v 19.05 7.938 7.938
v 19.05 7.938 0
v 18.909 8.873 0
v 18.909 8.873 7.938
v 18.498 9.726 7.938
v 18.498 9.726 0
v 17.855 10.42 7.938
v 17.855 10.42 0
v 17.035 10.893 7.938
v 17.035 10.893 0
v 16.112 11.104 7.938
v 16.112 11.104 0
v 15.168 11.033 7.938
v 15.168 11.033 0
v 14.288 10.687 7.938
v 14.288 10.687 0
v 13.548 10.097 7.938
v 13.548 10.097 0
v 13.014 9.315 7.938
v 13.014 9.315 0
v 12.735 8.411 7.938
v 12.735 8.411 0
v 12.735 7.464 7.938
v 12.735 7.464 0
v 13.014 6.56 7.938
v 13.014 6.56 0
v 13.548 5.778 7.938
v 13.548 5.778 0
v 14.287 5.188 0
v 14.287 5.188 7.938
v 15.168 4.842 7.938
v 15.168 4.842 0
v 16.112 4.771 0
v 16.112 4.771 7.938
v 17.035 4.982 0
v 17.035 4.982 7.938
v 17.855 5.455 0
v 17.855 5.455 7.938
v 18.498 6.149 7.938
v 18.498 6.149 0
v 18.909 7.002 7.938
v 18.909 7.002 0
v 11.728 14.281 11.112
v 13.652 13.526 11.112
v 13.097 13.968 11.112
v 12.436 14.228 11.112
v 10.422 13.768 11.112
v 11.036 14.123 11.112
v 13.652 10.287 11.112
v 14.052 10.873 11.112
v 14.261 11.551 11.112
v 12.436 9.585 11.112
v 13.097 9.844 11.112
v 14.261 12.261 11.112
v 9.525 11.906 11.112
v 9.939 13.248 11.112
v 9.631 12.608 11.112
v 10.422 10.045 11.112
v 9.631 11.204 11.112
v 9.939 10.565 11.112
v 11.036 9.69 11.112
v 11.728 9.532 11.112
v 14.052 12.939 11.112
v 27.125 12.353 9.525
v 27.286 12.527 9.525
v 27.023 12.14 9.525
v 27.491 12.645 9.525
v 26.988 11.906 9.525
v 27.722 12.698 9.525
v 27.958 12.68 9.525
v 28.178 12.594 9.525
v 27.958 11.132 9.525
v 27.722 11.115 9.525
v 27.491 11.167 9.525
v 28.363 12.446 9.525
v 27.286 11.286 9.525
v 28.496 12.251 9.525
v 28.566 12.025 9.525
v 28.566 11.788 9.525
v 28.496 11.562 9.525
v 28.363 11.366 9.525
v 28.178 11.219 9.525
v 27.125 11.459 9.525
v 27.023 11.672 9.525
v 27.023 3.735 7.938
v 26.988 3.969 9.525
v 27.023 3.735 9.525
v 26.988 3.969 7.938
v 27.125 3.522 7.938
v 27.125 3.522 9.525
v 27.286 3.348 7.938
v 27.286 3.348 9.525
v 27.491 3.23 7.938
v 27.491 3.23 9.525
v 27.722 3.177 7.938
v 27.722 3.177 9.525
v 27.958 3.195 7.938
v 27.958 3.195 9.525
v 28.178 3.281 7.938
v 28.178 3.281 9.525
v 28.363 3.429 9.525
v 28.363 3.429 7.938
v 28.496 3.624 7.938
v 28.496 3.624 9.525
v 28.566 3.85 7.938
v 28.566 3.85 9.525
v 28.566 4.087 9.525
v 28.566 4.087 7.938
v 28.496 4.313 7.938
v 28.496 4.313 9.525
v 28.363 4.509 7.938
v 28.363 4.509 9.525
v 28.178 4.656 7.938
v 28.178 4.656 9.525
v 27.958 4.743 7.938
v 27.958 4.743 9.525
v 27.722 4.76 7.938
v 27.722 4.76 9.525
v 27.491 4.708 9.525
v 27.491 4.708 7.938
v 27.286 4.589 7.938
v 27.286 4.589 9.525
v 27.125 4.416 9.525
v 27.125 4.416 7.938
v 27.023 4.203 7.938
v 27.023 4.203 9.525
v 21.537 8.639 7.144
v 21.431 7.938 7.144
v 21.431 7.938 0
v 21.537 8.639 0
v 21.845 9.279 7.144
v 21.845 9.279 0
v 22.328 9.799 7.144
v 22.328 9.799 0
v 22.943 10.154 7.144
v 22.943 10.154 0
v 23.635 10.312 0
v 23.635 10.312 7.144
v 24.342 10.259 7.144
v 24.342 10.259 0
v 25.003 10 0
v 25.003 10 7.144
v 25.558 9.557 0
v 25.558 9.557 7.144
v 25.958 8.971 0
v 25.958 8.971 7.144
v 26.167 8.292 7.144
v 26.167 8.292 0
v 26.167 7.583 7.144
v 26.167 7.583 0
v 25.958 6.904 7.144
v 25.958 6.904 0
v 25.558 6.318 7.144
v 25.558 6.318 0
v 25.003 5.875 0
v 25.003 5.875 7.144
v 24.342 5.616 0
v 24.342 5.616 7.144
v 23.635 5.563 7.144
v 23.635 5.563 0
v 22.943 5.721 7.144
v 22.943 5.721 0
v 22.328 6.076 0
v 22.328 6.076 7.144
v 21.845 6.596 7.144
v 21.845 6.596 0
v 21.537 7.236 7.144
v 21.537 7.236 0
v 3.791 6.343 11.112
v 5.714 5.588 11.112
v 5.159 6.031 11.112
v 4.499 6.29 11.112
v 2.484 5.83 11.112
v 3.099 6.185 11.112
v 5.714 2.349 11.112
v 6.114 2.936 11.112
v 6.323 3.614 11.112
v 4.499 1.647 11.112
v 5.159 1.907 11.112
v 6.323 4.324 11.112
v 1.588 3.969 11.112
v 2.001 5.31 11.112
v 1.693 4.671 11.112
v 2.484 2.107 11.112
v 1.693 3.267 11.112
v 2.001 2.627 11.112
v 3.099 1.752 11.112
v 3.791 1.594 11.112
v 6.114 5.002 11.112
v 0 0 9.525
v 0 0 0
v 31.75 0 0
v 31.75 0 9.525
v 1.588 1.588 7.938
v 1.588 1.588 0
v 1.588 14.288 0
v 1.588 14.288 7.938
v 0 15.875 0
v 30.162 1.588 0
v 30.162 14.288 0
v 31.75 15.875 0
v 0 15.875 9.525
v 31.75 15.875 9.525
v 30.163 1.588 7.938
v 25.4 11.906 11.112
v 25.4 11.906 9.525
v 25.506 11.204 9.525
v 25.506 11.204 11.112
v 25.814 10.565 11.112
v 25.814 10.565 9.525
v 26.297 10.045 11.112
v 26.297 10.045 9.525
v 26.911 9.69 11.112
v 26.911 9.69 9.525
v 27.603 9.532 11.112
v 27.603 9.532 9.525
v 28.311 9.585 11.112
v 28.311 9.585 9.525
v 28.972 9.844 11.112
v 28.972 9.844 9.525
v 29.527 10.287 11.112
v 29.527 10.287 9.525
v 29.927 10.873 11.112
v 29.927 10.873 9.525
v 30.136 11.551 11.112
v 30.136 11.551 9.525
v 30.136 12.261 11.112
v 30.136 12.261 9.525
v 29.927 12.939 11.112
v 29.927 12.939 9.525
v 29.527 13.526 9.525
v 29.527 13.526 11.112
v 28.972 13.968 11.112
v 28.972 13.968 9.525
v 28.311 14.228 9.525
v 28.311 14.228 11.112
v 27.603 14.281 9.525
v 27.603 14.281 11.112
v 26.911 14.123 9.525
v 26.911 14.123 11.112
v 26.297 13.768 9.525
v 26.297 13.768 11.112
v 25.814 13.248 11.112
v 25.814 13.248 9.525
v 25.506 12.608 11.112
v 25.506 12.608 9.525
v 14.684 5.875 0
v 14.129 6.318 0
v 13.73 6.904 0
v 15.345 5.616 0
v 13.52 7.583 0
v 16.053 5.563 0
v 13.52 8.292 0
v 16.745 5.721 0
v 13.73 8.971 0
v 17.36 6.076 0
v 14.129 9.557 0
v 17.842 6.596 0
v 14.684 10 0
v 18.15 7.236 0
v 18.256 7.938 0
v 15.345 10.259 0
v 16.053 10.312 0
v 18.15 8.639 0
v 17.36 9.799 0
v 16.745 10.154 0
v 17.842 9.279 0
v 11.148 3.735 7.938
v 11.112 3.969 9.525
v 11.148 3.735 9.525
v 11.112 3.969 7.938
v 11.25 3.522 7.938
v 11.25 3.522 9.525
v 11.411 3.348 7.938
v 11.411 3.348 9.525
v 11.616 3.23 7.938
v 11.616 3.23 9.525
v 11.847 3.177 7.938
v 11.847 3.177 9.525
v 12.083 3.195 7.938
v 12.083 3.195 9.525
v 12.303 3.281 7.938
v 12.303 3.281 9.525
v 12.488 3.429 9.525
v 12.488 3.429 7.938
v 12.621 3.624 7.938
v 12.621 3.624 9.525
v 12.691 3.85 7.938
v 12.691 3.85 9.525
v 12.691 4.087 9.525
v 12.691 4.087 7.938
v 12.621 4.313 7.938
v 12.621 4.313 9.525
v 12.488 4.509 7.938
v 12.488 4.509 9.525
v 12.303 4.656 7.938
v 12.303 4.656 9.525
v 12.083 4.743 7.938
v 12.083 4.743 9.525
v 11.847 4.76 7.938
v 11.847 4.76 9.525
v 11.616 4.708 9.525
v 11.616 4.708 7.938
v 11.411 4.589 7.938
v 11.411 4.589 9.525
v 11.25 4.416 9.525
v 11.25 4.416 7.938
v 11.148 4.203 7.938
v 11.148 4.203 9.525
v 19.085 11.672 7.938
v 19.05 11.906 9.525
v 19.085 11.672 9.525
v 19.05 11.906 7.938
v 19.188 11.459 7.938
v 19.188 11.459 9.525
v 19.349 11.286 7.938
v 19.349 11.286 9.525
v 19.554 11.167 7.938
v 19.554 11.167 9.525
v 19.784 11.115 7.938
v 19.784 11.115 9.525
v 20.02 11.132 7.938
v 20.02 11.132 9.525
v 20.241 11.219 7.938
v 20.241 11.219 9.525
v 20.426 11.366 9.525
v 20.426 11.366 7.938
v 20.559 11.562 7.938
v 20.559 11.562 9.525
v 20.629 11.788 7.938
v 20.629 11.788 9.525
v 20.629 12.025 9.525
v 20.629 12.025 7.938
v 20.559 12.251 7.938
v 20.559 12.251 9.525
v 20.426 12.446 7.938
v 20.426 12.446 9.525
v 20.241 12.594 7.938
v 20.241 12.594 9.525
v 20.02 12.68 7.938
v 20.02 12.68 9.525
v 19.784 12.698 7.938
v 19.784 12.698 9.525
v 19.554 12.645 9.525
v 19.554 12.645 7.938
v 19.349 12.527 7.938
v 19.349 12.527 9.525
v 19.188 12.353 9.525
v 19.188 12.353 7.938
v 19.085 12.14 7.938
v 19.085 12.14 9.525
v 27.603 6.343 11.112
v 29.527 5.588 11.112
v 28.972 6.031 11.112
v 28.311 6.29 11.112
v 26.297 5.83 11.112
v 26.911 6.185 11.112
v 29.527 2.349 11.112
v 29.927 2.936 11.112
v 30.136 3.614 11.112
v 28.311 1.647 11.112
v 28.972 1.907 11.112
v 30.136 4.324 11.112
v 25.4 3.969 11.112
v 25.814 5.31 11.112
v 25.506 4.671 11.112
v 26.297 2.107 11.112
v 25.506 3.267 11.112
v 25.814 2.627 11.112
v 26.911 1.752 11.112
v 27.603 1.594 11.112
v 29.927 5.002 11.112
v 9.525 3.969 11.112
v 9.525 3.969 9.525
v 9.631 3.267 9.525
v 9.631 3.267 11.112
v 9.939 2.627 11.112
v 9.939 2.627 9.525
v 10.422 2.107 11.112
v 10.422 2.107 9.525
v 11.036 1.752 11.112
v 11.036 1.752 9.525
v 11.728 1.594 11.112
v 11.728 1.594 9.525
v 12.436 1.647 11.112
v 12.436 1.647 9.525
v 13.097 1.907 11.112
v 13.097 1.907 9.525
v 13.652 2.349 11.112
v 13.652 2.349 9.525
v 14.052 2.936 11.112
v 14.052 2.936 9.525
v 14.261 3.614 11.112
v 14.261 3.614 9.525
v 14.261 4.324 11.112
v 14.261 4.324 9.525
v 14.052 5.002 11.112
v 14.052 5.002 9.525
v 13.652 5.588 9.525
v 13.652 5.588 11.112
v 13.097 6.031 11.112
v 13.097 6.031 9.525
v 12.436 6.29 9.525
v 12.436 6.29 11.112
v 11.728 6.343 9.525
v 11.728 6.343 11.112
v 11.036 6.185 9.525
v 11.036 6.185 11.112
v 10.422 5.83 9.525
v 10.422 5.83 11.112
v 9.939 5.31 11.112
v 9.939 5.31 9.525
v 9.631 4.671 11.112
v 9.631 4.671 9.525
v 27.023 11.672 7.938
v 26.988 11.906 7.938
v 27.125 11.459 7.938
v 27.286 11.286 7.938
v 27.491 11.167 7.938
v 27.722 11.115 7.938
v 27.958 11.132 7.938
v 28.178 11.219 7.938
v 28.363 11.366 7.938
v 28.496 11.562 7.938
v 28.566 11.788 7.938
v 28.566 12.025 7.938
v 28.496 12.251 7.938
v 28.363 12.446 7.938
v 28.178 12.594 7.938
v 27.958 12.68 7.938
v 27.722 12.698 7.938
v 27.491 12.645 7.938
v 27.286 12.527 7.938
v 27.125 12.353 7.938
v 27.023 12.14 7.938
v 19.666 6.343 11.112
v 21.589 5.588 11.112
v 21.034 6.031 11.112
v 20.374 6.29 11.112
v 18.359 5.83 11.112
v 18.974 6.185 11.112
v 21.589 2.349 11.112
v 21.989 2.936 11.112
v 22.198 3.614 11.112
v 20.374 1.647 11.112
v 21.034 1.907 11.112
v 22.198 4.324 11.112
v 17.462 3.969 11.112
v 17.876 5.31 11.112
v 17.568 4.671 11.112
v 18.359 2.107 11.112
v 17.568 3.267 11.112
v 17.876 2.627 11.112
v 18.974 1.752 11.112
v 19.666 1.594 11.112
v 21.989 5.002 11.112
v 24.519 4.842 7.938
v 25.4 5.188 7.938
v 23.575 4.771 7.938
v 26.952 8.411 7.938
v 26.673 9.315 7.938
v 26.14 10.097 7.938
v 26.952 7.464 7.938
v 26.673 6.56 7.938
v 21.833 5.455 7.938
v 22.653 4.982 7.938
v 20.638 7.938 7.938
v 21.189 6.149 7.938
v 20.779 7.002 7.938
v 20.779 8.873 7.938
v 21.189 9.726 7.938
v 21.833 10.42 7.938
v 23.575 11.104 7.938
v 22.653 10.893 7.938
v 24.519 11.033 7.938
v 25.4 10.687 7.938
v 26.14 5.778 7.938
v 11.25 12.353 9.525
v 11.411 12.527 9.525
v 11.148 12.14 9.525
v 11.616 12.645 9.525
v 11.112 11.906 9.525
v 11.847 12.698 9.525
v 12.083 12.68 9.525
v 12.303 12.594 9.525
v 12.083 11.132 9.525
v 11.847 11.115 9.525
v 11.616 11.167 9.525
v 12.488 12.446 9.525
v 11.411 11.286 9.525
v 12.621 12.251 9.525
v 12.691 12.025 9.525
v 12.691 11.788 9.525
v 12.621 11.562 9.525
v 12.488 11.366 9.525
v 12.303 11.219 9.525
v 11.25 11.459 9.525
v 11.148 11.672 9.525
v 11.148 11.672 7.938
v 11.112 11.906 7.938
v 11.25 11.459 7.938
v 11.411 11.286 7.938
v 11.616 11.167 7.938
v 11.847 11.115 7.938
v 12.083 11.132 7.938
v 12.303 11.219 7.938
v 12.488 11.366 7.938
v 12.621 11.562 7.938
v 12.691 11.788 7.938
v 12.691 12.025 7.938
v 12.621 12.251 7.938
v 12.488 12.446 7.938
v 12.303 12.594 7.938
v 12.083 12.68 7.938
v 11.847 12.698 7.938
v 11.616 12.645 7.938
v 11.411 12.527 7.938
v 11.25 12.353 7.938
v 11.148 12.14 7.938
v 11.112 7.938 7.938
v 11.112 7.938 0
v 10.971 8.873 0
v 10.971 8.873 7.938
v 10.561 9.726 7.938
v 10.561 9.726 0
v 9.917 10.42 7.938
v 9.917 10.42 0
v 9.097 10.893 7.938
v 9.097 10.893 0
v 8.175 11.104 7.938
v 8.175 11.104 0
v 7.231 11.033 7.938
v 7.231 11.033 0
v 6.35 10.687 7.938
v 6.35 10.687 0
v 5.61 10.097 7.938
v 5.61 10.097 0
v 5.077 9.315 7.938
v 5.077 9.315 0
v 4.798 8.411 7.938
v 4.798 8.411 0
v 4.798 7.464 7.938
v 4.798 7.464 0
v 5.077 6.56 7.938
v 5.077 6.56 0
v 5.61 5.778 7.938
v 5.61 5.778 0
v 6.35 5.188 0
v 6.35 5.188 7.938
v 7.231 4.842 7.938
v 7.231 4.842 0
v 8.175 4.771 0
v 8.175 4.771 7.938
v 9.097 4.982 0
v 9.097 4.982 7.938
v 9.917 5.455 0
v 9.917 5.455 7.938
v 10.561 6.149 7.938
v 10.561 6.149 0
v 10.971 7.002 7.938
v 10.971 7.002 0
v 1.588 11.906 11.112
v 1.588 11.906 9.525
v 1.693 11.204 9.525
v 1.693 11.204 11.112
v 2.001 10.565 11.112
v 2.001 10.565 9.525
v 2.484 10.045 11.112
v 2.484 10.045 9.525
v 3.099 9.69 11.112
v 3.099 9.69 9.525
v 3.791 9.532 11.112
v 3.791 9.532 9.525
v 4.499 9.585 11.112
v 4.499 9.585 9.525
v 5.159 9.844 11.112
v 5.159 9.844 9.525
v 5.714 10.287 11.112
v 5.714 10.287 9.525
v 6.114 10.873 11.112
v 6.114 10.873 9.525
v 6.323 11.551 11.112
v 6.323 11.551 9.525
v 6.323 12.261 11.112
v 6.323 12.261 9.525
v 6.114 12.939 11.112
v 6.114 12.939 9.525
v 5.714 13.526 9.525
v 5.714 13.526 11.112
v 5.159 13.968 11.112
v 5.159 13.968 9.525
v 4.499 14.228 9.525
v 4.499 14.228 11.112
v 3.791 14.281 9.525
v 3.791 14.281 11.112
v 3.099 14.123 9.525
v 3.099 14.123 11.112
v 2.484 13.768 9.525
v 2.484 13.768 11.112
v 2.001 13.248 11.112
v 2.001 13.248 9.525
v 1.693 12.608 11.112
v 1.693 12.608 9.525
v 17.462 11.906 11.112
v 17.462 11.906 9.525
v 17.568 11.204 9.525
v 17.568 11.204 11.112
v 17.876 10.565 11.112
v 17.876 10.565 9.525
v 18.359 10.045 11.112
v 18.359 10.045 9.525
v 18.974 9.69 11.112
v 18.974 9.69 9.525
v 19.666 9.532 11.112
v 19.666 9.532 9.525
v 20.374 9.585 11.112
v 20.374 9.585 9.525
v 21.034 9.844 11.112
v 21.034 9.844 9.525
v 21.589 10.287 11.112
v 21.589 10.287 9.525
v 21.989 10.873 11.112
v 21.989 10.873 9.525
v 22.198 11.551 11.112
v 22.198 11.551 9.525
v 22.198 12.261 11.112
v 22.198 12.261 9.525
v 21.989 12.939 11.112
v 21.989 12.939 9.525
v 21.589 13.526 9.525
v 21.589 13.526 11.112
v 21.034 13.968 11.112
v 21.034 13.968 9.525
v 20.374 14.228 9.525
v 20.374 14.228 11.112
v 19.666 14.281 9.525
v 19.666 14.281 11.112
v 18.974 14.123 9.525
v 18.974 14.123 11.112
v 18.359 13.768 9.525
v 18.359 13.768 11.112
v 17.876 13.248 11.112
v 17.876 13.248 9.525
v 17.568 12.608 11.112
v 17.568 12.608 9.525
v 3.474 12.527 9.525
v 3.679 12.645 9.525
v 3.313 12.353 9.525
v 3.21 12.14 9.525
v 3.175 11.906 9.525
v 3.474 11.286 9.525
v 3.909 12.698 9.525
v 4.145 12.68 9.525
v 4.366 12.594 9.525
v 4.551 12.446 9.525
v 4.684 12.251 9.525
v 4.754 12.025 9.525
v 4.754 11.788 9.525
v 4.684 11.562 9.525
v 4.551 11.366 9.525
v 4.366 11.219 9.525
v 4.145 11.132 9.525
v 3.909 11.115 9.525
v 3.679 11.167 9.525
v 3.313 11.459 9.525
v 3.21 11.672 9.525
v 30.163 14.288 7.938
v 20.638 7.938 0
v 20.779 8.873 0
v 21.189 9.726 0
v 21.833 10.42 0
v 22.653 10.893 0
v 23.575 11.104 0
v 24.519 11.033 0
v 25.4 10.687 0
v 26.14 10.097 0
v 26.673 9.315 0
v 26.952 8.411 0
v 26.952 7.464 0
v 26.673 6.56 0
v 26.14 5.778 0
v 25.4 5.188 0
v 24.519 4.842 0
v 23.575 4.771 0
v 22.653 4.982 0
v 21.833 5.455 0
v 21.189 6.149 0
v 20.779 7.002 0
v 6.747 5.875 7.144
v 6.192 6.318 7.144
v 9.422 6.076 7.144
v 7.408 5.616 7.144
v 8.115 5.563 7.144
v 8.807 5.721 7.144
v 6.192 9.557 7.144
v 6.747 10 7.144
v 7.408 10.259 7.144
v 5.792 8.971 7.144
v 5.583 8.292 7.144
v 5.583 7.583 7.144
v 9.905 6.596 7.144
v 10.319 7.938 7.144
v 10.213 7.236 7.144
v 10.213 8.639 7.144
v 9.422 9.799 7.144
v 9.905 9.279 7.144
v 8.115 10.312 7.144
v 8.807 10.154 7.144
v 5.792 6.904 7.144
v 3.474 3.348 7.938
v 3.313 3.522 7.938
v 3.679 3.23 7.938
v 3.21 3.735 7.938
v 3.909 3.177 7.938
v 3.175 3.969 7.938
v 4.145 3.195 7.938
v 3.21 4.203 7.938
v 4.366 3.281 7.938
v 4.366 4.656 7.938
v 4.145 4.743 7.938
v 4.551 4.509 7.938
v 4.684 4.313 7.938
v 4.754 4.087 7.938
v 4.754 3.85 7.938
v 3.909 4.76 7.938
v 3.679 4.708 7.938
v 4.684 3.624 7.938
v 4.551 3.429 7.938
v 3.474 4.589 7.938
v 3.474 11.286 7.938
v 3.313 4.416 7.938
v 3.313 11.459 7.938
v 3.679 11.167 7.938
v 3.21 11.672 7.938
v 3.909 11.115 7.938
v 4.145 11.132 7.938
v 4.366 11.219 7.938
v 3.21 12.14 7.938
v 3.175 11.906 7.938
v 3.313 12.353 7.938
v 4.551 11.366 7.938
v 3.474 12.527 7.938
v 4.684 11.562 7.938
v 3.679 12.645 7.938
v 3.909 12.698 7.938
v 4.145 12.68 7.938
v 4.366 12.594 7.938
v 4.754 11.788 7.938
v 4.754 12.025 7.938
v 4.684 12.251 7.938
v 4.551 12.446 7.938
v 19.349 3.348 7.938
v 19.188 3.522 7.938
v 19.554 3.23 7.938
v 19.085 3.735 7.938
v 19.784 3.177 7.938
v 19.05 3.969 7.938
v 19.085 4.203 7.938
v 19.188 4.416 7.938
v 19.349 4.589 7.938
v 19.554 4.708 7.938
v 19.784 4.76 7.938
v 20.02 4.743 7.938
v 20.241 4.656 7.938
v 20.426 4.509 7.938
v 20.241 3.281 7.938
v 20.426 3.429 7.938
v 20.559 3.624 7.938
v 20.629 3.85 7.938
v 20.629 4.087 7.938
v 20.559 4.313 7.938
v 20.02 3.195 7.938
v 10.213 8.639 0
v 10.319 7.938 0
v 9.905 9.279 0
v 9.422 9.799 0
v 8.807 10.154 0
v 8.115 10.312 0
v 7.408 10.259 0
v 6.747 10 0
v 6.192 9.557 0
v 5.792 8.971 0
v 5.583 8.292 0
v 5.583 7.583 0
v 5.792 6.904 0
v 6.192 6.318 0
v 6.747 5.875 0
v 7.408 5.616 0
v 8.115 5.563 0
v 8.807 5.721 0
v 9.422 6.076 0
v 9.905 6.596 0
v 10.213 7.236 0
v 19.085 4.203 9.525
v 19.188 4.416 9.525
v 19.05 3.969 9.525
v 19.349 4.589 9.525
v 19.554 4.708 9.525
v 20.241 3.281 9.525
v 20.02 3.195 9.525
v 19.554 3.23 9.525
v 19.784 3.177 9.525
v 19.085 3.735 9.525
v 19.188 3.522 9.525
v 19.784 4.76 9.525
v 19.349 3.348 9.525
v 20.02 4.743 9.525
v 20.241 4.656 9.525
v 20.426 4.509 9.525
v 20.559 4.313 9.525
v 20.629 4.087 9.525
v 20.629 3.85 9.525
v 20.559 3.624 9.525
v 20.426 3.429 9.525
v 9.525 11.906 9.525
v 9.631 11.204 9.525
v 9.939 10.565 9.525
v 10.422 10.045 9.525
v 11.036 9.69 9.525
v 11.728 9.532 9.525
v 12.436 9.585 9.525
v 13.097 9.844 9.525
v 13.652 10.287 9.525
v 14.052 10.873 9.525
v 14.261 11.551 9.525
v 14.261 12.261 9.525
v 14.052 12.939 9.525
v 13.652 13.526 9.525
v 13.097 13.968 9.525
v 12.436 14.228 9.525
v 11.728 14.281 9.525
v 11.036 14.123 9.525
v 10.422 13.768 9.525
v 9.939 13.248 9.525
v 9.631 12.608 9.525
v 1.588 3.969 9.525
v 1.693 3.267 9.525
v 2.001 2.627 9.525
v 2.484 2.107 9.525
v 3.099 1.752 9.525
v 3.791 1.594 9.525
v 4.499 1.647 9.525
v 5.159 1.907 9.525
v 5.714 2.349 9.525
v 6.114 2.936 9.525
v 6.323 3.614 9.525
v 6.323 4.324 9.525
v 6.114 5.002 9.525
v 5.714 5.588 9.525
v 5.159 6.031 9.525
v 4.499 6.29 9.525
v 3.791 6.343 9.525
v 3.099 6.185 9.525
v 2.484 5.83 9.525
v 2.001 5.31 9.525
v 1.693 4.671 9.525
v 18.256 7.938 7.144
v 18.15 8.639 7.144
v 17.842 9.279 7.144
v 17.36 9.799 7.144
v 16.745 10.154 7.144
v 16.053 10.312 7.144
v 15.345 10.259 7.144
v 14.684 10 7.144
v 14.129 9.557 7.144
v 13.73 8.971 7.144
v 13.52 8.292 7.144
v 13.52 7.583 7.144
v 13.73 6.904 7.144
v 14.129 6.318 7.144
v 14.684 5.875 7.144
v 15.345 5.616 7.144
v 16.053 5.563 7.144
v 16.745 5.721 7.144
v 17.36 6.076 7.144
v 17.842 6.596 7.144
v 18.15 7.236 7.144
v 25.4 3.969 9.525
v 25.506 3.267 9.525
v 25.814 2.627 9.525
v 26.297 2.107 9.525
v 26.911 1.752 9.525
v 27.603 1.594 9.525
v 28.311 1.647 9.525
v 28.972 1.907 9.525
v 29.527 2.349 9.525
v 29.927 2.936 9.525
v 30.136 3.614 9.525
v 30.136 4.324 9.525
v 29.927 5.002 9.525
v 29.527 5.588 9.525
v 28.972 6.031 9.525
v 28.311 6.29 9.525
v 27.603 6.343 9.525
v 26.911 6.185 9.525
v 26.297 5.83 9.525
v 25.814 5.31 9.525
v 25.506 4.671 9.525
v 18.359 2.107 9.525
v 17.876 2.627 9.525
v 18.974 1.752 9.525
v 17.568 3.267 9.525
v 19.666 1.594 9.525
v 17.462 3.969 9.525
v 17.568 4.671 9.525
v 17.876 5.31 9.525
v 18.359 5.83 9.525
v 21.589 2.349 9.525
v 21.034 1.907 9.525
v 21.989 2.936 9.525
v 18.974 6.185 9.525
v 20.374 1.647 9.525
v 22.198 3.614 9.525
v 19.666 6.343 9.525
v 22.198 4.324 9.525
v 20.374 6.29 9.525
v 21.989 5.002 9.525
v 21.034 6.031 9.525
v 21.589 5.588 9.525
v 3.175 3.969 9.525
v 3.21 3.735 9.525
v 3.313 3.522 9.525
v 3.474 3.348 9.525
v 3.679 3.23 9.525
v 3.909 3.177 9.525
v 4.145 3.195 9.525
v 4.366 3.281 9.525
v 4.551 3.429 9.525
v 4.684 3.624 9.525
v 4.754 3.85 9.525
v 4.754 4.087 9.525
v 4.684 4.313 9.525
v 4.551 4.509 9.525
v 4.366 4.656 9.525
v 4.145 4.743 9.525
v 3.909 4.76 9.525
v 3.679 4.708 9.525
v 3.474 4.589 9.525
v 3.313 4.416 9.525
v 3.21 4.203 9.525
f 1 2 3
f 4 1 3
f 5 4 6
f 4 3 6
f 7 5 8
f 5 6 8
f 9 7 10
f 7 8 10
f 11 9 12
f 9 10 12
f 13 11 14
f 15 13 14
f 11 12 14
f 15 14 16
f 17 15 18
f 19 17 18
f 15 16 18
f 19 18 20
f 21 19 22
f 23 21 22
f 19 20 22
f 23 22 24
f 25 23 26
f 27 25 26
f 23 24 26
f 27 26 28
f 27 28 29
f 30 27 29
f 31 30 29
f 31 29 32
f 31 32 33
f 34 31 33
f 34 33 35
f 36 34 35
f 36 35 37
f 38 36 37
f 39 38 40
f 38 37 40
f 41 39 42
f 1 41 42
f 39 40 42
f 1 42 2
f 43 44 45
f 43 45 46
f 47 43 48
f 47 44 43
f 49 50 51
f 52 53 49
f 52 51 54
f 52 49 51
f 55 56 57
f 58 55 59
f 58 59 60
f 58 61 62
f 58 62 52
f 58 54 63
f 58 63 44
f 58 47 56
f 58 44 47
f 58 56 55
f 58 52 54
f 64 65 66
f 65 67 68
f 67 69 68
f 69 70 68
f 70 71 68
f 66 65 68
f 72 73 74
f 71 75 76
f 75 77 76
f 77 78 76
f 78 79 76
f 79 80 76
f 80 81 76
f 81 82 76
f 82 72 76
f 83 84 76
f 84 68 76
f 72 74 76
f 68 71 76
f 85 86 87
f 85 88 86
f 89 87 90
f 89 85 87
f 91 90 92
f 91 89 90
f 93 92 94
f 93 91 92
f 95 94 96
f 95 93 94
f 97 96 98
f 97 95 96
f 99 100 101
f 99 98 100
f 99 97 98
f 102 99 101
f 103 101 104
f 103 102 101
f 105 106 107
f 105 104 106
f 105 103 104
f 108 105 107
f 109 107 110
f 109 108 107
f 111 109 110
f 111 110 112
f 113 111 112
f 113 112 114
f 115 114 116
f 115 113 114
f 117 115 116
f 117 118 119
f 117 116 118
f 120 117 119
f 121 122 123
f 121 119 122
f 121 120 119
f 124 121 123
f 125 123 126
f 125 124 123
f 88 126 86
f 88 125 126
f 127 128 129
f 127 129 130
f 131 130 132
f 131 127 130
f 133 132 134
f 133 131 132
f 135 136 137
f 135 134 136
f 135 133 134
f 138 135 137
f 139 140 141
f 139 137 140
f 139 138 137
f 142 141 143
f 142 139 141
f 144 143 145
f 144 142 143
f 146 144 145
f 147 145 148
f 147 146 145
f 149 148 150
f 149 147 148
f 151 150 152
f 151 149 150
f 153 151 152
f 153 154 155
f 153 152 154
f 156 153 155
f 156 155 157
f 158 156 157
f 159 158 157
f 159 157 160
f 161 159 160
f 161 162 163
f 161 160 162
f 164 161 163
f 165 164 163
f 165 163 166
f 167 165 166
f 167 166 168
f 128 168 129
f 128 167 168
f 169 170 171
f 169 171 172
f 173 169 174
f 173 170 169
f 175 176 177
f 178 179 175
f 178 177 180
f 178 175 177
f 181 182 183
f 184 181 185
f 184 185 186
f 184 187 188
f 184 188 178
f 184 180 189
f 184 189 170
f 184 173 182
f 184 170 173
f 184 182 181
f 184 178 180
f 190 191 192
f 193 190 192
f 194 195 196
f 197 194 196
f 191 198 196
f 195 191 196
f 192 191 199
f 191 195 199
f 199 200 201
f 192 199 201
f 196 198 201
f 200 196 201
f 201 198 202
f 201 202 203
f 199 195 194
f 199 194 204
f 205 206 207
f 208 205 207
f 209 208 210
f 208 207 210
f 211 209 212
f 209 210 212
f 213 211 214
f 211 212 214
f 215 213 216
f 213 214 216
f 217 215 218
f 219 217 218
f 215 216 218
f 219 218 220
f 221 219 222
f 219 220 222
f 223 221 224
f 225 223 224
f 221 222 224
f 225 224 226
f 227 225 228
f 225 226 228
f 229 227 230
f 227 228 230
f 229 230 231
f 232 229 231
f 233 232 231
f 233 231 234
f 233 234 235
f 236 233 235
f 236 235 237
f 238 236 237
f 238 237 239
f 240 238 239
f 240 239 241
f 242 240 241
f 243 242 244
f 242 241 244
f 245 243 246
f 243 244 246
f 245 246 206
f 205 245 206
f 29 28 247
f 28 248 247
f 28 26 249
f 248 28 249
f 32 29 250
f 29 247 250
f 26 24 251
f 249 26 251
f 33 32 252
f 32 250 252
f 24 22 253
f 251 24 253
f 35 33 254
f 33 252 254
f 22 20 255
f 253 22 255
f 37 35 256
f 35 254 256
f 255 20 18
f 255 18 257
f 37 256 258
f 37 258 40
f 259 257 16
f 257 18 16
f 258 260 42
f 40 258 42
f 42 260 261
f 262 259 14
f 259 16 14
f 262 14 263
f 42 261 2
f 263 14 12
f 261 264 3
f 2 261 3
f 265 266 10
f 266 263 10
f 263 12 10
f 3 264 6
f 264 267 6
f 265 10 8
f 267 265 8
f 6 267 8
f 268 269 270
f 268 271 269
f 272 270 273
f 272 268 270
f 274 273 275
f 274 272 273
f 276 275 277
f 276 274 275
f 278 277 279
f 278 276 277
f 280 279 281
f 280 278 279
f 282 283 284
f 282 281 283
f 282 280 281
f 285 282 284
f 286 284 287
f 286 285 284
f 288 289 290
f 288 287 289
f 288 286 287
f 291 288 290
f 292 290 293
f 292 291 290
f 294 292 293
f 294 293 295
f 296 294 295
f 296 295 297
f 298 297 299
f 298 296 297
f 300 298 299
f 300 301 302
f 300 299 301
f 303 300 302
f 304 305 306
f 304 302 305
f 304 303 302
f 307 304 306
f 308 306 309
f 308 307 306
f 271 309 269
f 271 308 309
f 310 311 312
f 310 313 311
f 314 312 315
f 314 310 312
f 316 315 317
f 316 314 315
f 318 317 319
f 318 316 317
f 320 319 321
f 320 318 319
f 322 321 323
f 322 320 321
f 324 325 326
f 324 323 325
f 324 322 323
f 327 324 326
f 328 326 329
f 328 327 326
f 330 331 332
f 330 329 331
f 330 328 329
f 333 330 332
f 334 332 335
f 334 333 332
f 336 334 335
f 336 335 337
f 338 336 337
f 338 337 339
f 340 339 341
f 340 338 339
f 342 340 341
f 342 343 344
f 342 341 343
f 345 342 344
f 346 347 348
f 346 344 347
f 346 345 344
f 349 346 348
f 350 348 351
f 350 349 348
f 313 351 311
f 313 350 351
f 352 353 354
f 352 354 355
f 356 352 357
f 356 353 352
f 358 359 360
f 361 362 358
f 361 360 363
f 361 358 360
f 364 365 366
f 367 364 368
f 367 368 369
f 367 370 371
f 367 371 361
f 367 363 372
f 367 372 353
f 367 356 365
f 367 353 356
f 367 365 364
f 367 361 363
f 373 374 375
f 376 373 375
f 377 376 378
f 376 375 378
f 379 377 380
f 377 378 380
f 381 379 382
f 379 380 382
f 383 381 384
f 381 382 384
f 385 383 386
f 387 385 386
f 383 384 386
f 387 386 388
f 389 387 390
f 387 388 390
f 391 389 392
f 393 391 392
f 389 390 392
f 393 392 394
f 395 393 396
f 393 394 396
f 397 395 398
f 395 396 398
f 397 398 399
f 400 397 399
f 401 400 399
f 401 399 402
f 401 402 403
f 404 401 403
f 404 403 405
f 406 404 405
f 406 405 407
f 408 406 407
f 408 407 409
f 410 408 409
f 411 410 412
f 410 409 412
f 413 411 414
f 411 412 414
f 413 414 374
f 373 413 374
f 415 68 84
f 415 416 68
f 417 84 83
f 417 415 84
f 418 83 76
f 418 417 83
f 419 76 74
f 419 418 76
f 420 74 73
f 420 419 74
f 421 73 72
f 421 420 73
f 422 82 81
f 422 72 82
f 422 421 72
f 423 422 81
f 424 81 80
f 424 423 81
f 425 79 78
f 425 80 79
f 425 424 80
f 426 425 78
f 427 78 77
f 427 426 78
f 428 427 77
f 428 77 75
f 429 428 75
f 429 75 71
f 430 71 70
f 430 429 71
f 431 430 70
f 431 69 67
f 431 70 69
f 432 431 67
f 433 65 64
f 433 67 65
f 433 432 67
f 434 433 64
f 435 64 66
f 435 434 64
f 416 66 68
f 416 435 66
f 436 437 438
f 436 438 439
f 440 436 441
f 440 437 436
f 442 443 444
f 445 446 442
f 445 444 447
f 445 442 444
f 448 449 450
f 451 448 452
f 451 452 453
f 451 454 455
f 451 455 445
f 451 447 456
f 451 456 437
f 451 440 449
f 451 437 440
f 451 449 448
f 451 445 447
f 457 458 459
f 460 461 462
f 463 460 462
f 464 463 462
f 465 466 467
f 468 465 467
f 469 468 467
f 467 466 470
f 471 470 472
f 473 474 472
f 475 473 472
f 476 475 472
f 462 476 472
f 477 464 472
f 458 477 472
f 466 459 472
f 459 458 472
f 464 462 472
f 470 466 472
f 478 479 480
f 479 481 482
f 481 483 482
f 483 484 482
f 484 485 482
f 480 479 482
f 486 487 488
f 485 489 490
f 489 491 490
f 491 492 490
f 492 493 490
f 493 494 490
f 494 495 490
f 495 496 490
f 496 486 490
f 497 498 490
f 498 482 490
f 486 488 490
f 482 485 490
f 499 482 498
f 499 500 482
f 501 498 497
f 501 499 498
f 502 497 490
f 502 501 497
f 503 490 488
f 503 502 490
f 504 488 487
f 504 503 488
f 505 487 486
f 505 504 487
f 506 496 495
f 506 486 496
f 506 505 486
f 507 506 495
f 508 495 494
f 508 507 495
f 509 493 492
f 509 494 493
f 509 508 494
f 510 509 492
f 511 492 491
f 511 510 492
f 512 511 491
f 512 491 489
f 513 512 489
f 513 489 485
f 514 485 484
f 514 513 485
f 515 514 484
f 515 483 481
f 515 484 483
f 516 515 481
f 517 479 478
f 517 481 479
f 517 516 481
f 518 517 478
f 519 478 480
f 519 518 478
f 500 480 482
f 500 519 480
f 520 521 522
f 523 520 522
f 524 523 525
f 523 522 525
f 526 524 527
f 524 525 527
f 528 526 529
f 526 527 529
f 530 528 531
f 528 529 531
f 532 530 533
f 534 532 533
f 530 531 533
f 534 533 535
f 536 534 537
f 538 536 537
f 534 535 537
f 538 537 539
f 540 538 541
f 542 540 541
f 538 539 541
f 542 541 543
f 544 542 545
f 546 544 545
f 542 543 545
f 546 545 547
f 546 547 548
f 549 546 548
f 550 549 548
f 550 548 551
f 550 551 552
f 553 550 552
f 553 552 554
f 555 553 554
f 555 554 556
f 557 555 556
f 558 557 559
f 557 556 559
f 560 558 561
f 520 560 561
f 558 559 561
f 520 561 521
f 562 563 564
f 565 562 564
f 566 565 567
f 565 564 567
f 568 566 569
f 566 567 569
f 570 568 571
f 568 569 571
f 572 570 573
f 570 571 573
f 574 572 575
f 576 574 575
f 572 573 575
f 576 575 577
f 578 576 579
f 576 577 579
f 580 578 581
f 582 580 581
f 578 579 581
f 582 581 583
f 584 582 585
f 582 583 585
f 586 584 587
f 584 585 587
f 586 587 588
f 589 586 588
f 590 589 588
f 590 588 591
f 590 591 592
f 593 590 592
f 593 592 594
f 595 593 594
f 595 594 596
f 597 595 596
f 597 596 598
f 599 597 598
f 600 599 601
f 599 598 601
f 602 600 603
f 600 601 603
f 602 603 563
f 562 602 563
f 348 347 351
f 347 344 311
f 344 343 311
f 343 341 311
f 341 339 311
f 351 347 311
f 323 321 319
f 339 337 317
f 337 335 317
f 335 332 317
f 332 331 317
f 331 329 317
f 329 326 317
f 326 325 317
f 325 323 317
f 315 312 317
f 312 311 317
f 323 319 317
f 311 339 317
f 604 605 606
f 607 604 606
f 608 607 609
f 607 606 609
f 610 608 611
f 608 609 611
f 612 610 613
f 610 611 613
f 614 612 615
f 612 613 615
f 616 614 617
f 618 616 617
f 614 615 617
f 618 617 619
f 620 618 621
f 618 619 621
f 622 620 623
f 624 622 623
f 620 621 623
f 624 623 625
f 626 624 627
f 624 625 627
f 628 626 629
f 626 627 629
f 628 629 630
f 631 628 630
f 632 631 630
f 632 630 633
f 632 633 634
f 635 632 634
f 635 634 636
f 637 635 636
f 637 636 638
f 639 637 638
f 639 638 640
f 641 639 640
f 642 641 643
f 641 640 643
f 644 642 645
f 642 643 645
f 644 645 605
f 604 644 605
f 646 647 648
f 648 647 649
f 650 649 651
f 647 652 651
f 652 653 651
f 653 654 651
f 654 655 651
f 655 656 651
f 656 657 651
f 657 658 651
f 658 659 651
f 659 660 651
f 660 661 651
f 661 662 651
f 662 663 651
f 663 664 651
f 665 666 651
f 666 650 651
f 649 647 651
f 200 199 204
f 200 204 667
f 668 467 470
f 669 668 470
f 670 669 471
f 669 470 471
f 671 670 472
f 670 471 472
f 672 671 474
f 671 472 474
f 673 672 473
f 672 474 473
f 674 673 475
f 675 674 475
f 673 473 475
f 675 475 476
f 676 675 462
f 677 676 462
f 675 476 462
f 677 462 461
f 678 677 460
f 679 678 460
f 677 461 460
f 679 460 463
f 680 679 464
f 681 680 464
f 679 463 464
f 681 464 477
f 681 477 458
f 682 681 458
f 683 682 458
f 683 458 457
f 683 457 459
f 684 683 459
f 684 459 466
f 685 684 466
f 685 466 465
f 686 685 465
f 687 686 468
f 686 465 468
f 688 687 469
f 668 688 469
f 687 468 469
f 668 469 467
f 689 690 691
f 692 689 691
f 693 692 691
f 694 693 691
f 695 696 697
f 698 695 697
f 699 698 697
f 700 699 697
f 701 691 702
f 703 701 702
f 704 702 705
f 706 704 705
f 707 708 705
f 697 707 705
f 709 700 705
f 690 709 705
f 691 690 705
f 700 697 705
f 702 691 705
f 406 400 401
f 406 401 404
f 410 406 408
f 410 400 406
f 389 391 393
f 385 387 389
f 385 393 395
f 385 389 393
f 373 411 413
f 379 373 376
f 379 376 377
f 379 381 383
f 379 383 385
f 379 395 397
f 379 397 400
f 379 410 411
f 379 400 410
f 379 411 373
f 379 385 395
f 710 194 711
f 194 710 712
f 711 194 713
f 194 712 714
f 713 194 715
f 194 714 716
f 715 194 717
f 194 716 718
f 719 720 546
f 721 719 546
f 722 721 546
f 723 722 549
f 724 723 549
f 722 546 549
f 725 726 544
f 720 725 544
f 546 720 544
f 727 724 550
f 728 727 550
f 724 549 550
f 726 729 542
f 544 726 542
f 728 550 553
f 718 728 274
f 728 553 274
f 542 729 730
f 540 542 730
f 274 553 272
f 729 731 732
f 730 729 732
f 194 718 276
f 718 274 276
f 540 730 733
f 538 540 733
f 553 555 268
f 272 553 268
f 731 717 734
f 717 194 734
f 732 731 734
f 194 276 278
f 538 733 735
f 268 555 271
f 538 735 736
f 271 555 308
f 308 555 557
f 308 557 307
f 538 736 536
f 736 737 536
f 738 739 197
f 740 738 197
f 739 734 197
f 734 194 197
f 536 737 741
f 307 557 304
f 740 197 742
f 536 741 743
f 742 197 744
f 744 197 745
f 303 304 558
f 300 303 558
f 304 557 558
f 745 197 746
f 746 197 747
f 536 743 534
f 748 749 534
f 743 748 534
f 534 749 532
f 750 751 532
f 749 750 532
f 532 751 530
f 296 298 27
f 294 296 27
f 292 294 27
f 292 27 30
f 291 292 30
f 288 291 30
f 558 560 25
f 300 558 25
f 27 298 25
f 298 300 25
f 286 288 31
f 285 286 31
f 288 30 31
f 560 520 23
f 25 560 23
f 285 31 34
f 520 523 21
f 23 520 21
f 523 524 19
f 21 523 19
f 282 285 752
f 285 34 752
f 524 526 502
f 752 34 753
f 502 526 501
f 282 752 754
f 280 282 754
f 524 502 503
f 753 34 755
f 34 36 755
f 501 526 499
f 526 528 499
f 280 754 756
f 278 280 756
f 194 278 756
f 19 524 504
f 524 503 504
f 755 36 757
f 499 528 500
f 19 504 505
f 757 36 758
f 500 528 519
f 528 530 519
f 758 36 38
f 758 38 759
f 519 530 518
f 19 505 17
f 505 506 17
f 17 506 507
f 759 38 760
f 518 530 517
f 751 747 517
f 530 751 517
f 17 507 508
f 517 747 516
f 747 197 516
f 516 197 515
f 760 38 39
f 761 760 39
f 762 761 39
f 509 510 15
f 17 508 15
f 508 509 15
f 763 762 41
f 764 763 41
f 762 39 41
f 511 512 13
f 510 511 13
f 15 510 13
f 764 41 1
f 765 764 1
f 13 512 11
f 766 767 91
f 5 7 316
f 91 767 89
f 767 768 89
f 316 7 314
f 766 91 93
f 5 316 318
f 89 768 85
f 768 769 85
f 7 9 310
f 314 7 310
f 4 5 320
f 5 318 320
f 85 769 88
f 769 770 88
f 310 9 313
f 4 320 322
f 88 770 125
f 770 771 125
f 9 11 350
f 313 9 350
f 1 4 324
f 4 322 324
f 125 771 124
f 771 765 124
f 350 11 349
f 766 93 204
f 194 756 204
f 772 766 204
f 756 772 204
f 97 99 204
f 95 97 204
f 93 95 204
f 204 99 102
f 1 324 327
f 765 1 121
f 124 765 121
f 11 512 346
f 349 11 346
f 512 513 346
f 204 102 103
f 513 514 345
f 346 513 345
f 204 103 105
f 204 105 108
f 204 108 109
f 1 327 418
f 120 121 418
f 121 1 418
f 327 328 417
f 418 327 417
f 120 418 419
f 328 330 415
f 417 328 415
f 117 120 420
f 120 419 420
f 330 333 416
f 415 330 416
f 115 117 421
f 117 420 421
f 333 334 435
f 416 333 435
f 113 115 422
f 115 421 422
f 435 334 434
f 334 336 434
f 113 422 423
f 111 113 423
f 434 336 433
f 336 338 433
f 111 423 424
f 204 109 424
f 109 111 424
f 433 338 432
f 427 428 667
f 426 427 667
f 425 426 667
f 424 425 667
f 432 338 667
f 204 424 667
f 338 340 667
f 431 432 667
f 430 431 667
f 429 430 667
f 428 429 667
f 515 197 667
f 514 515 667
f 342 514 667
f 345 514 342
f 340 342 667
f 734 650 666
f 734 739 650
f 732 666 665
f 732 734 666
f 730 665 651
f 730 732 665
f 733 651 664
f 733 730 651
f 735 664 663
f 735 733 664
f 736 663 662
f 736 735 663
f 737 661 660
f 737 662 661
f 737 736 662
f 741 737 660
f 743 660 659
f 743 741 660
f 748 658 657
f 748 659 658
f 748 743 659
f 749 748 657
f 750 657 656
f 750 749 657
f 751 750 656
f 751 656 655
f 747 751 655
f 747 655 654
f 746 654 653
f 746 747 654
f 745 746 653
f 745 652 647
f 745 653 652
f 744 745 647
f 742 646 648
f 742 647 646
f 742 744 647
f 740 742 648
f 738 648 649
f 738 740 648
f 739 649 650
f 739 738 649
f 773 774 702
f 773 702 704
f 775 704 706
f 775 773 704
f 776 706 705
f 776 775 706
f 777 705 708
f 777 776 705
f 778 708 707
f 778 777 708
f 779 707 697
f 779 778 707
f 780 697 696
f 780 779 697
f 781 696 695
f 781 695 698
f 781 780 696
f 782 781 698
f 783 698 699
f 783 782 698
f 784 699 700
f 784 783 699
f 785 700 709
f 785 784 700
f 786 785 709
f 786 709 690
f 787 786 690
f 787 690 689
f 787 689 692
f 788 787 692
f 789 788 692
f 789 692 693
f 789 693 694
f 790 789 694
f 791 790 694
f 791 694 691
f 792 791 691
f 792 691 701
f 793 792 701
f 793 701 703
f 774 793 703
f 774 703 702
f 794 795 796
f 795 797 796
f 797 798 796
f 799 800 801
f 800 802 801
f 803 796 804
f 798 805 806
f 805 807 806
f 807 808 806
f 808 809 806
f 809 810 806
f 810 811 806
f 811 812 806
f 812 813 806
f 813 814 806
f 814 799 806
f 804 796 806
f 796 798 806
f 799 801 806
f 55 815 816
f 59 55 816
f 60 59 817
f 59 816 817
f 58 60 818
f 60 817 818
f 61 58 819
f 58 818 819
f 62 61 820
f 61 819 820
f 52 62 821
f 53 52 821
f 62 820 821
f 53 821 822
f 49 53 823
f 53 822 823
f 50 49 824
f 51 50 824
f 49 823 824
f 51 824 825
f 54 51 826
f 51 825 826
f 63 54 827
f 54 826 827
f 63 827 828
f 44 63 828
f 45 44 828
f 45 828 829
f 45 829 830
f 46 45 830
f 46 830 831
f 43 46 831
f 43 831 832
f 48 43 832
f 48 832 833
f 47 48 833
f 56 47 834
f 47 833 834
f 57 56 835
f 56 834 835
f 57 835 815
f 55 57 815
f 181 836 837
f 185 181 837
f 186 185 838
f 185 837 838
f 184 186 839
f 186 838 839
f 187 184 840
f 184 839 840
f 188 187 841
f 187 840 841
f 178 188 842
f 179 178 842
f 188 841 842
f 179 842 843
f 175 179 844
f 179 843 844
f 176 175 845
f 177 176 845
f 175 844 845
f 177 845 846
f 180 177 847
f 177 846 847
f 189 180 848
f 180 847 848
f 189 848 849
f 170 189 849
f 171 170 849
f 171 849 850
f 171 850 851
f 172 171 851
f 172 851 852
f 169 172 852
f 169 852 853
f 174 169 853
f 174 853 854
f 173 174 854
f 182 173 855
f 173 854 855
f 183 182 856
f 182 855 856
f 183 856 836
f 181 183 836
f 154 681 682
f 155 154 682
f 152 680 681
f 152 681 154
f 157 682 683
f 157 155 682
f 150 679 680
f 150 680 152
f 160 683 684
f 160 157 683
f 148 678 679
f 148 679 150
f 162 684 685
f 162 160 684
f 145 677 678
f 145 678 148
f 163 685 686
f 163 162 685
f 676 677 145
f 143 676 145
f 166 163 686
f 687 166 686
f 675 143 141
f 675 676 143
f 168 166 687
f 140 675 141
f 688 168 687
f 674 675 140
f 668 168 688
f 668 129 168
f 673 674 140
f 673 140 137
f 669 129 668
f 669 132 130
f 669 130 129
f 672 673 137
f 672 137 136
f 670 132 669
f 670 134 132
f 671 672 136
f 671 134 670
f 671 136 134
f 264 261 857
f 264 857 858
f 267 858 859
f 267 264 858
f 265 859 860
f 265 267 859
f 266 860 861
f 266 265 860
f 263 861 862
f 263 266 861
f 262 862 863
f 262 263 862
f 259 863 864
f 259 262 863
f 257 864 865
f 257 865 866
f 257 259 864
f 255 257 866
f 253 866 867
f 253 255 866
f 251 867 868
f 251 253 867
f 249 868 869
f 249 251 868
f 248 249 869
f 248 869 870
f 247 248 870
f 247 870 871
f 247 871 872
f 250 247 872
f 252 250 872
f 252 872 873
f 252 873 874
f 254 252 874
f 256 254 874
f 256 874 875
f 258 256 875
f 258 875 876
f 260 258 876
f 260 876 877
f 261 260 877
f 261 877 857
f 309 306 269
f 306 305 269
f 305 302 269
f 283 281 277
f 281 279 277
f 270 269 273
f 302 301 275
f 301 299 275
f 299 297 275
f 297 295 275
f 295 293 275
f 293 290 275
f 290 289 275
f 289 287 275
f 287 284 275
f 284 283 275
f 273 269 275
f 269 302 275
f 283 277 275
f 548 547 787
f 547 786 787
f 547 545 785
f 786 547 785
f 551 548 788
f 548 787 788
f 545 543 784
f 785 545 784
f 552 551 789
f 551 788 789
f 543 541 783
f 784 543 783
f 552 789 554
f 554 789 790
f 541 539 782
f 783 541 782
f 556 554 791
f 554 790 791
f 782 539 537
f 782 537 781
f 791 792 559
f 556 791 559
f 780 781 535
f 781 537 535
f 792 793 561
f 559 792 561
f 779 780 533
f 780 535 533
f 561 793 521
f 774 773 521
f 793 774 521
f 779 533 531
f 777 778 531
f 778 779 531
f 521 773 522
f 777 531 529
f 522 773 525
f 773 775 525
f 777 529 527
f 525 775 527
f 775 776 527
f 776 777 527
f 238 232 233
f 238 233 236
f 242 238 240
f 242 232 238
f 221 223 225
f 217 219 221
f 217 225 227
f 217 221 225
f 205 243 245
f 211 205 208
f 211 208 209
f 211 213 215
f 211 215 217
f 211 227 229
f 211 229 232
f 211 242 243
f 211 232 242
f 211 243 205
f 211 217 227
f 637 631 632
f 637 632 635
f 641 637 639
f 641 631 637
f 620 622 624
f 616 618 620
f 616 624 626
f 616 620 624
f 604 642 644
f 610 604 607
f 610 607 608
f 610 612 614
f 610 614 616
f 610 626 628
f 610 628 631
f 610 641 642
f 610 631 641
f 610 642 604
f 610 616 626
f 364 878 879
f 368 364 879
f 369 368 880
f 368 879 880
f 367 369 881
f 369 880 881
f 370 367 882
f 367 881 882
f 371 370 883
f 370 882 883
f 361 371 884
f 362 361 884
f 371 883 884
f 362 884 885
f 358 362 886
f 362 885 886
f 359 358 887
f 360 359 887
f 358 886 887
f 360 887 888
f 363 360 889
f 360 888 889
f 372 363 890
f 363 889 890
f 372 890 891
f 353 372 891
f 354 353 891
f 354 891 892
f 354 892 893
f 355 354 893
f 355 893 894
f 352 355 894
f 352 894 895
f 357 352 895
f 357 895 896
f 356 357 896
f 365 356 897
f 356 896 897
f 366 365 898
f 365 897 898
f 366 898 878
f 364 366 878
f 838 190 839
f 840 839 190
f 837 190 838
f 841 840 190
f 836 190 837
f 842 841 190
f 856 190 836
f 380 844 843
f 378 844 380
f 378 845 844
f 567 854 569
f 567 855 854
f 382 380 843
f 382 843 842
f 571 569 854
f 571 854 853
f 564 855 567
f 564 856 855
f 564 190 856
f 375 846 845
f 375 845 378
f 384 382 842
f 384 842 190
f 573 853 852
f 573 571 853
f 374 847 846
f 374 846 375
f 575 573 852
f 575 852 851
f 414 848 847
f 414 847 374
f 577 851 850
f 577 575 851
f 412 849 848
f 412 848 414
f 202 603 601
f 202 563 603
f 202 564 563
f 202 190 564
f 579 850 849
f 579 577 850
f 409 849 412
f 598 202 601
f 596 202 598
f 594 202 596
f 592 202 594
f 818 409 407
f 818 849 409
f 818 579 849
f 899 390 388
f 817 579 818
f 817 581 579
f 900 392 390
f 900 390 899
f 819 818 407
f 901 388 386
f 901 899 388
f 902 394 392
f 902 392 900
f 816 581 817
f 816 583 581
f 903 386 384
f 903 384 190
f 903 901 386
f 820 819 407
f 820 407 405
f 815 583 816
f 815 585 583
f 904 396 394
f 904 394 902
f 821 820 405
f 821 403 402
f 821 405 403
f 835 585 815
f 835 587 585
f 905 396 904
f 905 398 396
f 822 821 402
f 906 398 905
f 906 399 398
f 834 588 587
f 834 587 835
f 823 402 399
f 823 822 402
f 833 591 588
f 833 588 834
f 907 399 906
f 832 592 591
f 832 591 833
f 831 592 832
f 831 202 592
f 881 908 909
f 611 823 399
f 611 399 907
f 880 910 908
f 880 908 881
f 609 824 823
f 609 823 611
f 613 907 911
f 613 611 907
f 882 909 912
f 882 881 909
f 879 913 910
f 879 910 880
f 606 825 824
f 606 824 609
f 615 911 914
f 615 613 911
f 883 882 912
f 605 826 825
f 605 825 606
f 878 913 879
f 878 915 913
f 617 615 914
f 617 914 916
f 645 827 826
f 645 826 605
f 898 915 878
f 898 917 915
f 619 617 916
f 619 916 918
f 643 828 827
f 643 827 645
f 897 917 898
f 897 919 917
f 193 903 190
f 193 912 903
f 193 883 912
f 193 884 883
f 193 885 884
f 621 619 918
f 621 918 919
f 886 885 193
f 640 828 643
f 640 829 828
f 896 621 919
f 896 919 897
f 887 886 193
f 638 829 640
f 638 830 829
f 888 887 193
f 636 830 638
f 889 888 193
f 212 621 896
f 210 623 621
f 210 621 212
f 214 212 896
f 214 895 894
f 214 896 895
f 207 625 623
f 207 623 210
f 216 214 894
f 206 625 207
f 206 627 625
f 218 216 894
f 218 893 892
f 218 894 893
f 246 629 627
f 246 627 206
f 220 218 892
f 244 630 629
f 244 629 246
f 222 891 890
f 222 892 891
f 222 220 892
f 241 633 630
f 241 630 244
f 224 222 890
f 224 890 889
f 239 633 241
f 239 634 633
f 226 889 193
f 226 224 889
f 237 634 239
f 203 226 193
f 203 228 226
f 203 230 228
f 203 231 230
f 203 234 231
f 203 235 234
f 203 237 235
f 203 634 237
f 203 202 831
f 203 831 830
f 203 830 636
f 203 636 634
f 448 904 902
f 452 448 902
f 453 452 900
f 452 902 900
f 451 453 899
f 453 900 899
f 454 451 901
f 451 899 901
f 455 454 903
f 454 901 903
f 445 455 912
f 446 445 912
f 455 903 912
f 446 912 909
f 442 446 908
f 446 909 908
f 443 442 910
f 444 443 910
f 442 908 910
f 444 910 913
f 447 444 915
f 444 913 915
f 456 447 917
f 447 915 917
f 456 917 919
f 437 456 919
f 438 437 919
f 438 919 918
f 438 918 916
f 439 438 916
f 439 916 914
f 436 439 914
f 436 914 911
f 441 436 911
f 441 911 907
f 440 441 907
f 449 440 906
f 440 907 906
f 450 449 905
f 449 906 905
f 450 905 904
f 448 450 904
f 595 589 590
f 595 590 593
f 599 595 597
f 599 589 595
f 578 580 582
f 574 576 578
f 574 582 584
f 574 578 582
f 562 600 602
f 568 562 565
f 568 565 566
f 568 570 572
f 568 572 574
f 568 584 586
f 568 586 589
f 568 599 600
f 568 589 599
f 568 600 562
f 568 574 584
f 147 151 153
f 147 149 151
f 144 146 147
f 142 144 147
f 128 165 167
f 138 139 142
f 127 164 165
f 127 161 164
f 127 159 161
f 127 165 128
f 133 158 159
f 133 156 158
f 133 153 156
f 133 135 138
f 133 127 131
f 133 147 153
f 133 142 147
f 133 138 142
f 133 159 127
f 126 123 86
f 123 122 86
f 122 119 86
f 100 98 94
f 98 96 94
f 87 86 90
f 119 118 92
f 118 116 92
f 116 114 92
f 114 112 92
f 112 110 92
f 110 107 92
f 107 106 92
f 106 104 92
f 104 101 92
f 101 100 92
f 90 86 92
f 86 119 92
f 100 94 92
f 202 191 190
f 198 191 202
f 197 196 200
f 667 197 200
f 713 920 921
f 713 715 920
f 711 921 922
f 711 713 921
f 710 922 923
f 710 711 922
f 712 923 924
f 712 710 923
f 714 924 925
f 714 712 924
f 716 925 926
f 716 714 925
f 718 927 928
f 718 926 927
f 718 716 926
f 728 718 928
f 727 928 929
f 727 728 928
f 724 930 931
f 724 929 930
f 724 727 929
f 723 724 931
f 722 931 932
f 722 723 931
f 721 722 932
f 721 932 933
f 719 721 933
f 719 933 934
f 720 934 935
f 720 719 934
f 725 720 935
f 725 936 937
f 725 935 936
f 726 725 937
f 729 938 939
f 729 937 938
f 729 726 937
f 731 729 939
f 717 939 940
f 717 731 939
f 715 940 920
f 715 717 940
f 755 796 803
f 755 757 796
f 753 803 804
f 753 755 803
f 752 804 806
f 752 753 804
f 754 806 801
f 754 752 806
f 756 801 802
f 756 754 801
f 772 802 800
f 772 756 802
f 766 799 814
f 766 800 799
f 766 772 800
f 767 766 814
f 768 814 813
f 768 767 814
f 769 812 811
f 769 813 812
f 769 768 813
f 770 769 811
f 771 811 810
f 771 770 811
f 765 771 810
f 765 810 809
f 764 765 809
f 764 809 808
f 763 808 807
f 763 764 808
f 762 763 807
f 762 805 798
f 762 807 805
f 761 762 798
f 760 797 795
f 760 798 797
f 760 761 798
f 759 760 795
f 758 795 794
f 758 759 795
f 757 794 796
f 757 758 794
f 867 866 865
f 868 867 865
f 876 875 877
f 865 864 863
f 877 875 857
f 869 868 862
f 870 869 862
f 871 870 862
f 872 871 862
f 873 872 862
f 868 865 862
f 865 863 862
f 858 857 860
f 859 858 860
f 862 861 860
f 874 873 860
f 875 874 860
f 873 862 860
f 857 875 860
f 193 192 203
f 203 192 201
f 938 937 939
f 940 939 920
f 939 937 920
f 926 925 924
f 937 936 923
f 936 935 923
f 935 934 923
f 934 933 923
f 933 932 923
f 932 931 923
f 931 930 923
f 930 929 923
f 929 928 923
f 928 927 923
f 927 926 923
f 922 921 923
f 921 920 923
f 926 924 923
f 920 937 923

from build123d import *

# Parameters (mm, degrees)
SKETCH1_W              = 31.75
SKETCH1_H              = 15.875
MAIN_BRICK_DEPTH       = 9.525
SKETCH2_R              = 2.38125
PEG_DEPTH              = 1.5875
PEG_PATTERN_COUNT      = 2
PEG_PATTERN_PITCH      = 7.9375
PEG_PATTERN_COUNT_DIR2 = 4
PEG_PATTERN_PITCH_DIR2 = 7.9375
SHELL_BRICK_T          = -1.5875
SKETCH3_R              = 3.175
BOSS_EXTRUDE5_DEPTH    = 7.9375
SHELL9_T               = -0.79375
LPATTERN7_OUTLINE_R    = 3.175
LPATTERN7_OUTLINE_R_2  = 2.38125
LPATTERN7_DEPTH        = 7.9375
LPATTERN7_START        = 7.14375
LPATTERN7_2_OUTLINE_R  = 2.38125
LPATTERN7_2_DEPTH      = 0.79375


# Read off the part's stored shape, not the designer's step: LPattern7
with BuildPart() as part:
    # Sketch1 → Main-Brick (new body)
    with BuildSketch(Plane.XY):
        with Locations((15.875, 7.9375)):
            Rectangle(SKETCH1_W, SKETCH1_H)
    extrude(amount=MAIN_BRICK_DEPTH)

    # Sketch2 → Peg (add)
    with BuildSketch(Plane.XY.offset(9.525)):
        with Locations(Location((3.96875, 11.90625, 0), (0, 0, 180))):
            Circle(SKETCH2_R)
    peg = extrude(amount=PEG_DEPTH)

    # Peg Pattern: Peg 2 × 4
    with Locations(*[(j * PEG_PATTERN_PITCH_DIR2, -i * PEG_PATTERN_PITCH, 0) for i in range(PEG_PATTERN_COUNT) for j in range(PEG_PATTERN_COUNT_DIR2) if (i, j) != (0, 0)]):
        add(peg)

    # Shell-Brick
    shell_brick_openings = [part.faces().sort_by_distance(p)[0] for p in [
        (15.875, 7.9375, 0),
    ]]
    offset(amount=SHELL_BRICK_T, openings=shell_brick_openings, kind=Kind.INTERSECTION)

    # LPattern7 outline → LPattern7 (add)
    # profile 1 of 2: a face of its own
    with BuildSketch(Plane.XY):
        with Locations((15.875, 7.9375)):
            Circle(LPATTERN7_OUTLINE_R)
        with Locations((15.875, 7.9375)):
            Circle(LPATTERN7_OUTLINE_R_2, mode=Mode.SUBTRACT)
    # profile 2 of 2: a face of its own
    with BuildSketch(Plane.XY):
        with Locations((7.9375, 7.9375)):
            Circle(LPATTERN7_OUTLINE_R)
        with Locations((7.9375, 7.9375)):
            Circle(LPATTERN7_OUTLINE_R_2, mode=Mode.SUBTRACT)
    extrude(amount=LPATTERN7_DEPTH)

    # LPattern7 2 outline → LPattern7 2 (add)
    with BuildSketch(Plane.XY.offset(LPATTERN7_START)):
        with Locations((15.875, 7.9375)):
            Circle(LPATTERN7_2_OUTLINE_R)
        with Locations((7.9375, 7.9375)):
            Circle(LPATTERN7_2_OUTLINE_R)
    extrude(amount=LPATTERN7_2_DEPTH)


with BuildPart() as body_2:
    # Sketch3 → Boss-Extrude5 (new body)
    with BuildSketch(Plane(origin=(0, 0, 7.9375), x_dir=(-1, 0, 0), z_dir=(0, 0, -1))):
        with Locations((-23.8125, 7.9375)):
            Circle(SKETCH3_R)
    extrude(amount=BOSS_EXTRUDE5_DEPTH)

    # Shell9
    shell9_openings = [body_2.faces().sort_by_distance(p)[0] for p in [
        (23.8125, 7.9375, 0),
    ]]
    offset(amount=SHELL9_T, openings=shell9_openings, kind=Kind.INTERSECTION)


solid = Compound([part.part, body_2.part])
